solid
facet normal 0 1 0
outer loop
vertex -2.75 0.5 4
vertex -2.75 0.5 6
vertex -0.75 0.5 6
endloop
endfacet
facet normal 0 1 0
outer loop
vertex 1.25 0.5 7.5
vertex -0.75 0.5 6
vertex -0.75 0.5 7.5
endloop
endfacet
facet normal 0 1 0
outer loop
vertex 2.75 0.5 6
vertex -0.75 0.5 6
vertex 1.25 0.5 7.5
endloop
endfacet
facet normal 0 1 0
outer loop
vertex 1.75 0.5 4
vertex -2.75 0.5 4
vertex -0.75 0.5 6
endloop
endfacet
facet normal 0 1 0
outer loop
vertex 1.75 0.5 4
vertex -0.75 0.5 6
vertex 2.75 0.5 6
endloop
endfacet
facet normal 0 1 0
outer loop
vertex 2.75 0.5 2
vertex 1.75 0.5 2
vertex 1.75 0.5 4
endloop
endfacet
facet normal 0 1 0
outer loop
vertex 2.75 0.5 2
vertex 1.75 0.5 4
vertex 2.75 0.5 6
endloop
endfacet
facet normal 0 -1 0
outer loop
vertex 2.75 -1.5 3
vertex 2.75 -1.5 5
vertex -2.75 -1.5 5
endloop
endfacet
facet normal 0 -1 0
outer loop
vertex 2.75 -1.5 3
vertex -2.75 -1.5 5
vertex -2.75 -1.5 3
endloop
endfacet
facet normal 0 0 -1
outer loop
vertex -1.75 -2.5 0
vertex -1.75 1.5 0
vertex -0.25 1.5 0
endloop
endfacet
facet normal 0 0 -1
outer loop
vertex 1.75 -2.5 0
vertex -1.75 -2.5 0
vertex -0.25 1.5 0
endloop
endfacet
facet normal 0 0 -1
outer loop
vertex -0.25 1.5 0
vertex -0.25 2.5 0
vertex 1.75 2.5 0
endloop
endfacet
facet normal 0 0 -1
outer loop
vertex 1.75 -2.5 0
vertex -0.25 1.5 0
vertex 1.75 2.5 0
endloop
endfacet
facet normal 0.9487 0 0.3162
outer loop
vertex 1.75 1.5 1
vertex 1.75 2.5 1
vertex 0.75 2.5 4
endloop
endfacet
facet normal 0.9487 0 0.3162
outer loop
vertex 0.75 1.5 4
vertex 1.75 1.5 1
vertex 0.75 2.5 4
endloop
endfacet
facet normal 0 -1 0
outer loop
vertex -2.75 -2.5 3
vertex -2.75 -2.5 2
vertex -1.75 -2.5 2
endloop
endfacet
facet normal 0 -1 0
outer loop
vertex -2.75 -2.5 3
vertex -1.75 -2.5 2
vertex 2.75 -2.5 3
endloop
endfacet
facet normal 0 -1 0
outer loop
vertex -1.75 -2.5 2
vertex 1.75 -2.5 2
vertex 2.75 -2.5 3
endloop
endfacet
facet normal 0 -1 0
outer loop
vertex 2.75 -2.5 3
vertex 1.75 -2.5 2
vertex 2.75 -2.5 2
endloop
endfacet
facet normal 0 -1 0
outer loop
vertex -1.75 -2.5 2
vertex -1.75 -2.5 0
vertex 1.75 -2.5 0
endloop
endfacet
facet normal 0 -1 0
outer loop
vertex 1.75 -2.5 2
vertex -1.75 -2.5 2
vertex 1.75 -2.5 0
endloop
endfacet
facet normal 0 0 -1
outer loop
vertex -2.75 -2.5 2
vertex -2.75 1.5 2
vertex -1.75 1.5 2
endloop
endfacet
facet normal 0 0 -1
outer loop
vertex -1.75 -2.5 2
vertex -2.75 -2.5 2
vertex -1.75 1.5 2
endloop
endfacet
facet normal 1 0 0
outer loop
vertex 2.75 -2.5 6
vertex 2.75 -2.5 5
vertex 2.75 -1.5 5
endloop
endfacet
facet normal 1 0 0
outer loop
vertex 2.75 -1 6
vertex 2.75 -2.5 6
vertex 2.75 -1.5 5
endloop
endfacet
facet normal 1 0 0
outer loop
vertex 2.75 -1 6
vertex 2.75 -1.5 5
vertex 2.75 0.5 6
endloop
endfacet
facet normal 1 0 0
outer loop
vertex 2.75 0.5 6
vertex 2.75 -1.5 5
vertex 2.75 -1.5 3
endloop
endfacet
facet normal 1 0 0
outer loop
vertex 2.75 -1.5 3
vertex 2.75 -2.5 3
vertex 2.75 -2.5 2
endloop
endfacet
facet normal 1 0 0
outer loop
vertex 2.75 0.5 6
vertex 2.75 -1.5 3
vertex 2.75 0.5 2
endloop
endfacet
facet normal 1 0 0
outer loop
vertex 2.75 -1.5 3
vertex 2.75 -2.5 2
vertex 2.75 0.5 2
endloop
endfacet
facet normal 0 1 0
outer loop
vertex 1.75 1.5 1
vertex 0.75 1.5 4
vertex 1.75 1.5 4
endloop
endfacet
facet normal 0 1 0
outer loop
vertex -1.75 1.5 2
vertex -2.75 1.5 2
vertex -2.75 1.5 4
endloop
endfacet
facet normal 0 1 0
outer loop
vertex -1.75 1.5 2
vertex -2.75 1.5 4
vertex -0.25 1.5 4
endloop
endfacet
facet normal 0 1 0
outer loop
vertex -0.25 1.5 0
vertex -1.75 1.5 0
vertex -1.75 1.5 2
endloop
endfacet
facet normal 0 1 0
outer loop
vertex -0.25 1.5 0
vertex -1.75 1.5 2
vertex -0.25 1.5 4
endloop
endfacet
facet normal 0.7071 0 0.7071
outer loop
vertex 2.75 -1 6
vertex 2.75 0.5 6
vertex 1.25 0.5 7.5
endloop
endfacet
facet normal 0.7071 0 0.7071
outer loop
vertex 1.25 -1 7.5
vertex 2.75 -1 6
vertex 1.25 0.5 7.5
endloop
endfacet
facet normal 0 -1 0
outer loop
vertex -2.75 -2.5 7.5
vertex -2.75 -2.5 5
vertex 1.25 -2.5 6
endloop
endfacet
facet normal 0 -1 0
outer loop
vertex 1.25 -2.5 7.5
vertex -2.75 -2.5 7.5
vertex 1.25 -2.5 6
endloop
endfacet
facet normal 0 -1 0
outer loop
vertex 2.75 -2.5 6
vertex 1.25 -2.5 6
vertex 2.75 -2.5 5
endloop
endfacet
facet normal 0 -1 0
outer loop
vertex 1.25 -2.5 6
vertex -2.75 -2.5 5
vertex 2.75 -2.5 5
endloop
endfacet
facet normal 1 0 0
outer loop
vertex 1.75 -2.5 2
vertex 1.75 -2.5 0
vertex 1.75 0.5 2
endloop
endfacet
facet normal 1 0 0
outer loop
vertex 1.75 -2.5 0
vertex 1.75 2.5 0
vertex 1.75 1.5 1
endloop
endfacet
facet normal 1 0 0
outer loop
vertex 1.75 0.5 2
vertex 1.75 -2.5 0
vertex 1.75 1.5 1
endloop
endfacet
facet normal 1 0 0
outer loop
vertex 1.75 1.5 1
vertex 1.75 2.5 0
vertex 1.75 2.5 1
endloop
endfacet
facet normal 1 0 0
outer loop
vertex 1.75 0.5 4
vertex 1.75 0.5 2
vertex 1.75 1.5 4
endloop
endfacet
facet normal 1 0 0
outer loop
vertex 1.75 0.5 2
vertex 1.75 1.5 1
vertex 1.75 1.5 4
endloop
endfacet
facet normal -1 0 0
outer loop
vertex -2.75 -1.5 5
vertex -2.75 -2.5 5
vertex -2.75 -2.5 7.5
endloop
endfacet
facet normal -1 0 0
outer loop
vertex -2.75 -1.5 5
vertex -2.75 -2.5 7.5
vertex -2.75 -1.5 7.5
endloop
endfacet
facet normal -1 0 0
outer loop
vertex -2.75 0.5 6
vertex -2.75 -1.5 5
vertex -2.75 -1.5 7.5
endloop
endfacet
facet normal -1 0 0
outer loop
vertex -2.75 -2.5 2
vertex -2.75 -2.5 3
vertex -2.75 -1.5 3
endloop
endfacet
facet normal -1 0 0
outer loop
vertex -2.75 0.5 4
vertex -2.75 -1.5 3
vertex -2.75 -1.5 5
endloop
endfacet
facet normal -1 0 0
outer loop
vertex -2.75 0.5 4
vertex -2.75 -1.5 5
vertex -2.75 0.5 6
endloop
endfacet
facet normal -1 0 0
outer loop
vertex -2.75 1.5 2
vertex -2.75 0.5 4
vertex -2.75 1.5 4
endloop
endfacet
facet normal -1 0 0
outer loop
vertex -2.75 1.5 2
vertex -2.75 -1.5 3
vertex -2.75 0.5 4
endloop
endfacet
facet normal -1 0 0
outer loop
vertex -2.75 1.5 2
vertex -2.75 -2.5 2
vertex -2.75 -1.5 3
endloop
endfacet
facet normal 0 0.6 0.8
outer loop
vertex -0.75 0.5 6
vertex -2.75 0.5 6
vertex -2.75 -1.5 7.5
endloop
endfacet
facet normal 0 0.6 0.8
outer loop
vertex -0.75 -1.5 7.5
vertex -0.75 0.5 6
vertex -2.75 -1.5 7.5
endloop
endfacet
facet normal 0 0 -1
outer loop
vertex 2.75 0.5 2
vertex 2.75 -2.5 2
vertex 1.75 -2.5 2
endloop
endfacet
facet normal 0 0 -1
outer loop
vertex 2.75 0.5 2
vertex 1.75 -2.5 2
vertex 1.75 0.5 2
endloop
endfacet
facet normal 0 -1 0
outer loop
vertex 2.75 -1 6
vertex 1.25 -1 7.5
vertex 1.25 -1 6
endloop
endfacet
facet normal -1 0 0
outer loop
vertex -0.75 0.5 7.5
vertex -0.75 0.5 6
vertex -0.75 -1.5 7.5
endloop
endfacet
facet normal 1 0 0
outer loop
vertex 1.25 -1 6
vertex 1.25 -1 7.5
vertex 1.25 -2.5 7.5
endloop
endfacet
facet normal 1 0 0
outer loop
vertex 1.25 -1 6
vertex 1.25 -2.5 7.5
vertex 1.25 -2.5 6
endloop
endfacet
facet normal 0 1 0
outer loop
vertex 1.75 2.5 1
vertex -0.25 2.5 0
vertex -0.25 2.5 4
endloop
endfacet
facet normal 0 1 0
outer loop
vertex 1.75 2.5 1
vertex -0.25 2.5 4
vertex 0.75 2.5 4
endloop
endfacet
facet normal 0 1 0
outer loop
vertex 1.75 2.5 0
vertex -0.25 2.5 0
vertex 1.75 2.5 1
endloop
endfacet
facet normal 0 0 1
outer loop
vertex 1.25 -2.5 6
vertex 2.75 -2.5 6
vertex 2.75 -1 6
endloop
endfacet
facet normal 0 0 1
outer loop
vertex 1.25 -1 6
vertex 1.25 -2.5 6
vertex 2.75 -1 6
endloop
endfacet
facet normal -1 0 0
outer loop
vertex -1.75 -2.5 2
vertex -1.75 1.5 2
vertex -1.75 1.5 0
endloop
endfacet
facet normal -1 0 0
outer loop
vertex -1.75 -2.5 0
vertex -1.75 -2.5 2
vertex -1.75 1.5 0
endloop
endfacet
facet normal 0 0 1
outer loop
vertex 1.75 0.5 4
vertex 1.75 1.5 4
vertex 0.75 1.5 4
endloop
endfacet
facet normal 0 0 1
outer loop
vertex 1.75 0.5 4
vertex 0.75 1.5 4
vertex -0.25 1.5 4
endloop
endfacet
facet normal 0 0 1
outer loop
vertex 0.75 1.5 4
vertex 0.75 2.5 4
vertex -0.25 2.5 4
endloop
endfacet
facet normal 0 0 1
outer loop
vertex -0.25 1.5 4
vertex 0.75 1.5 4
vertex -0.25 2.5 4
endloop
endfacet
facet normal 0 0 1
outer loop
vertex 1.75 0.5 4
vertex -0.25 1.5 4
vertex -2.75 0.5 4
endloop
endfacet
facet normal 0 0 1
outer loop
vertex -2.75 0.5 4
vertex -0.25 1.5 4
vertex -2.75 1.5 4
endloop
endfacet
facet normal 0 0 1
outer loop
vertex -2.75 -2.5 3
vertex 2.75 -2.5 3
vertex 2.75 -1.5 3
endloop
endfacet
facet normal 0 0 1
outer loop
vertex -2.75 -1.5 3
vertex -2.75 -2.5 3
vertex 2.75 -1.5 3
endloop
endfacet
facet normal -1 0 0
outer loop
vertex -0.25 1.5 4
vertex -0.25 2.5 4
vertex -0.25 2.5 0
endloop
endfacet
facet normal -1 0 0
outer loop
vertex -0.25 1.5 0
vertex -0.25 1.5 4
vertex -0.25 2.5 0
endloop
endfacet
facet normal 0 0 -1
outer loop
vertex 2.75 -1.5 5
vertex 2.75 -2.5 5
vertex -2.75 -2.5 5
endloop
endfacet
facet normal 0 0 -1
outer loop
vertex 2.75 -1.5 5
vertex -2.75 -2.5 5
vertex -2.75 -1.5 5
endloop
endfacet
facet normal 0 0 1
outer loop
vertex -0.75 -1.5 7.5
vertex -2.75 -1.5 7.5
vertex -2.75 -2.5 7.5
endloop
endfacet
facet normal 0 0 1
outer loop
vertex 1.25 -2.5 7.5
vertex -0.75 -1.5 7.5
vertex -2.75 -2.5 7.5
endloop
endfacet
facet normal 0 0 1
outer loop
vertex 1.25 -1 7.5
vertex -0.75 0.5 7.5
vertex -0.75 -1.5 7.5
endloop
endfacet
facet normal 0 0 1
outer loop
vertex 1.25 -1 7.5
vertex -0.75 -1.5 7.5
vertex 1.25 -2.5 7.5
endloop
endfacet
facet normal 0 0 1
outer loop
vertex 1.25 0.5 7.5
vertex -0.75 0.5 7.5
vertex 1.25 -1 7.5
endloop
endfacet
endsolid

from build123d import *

# Parameters (mm, degrees)
SKETCH1_W           = 5.5
SKETCH1_H           = 5
BOSS_EXTRUDE1_DEPTH = 7.5
CUT_EXTRUDE1_DEPTH  = 2
CUT_EXTRUDE2_DEPTH  = 1
CUT_EXTRUDE3_DEPTH  = 2
CUT_EXTRUDE4_DEPTH  = 2
SKETCH6_W           = 2.5
SKETCH6_H           = 4
CUT_EXTRUDE5_DEPTH  = 1
SKETCH7_W           = 1
SKETCH7_H           = 2
CUT_EXTRUDE6_DEPTH  = 5
SKETCH8_W           = 2
SKETCH8_H           = 1
CUT_EXTRUDE7_DEPTH  = 6.5
CUT_EXTRUDE8_DEPTH  = 4
SKETCH11_W          = 1.5
SKETCH11_H          = 1.5
CUT_EXTRUDE9_DEPTH  = 1.5


with BuildPart() as part:
    # Sketch1 → Boss-Extrude1 (new body)
    with BuildSketch(Plane.XY):
        Rectangle(SKETCH1_W, SKETCH1_H)
    extrude(amount=BOSS_EXTRUDE1_DEPTH)

    # Sketch2 → Cut-Extrude1 (cut)
    with BuildSketch(Plane.ZY.offset(2.75)):
        Polygon((6, 2.5), (7.5, -1.5), (7.5, 2.5), align=None)
    extrude(amount=-CUT_EXTRUDE1_DEPTH, mode=Mode.SUBTRACT)

    # Sketch3 → Cut-Extrude2 (cut)
    with BuildSketch(Plane(origin=(2.75, 0, 0), x_dir=(0, 0, -1), z_dir=(1, 0, 0))):
        Polygon((0, -2.5), (-2, -2.5), (-2, 0.5), (-4, 0.5), (-4, 2.5), (0, 2.5), align=None)
    extrude(amount=-CUT_EXTRUDE2_DEPTH, mode=Mode.SUBTRACT)

    # Sketch4 → Cut-Extrude3 (cut)
    with BuildSketch(Plane(origin=(0, 2.5, 0), x_dir=(1, 0, 0), z_dir=(0, 1, 0))):
        Polygon((2.75, -7.5), (2.75, -4), (1.75, -4), (-2.75, -4), (-2.75, -6), (-0.75, -6), (-0.75, -7.5), align=None)
    extrude(amount=-CUT_EXTRUDE3_DEPTH, mode=Mode.SUBTRACT)

    # Sketch5 → Cut-Extrude4 (cut)
    with BuildSketch(Plane.ZY.offset(2.75)):
        Polygon((6, 2.5), (6, 0.5), (7.5, -1.5), align=None)
    extrude(amount=-CUT_EXTRUDE4_DEPTH, mode=Mode.SUBTRACT)

    # Sketch6 → Cut-Extrude5 (cut)
    with BuildSketch(Plane(origin=(0, 2.5, 0), x_dir=(1, 0, 0), z_dir=(0, 1, 0))):
        Polygon((1.75, -4), (1.75, -1), (0.75, -4), align=None)
        with Locations((-1.5, -2)):
            Rectangle(SKETCH6_W, SKETCH6_H)
    extrude(amount=-CUT_EXTRUDE5_DEPTH, mode=Mode.SUBTRACT)

    # Sketch7 → Cut-Extrude6 (cut, through all)
    with BuildSketch(Plane(origin=(0, 1.5, 0), x_dir=(1, 0, 0), z_dir=(0, 1, 0))):
        with Locations((-2.25, -1)):
            Rectangle(SKETCH7_W, SKETCH7_H)
    extrude(amount=-CUT_EXTRUDE6_DEPTH, mode=Mode.SUBTRACT)

    # Sketch8 → Cut-Extrude7 (cut, through all)
    with BuildSketch(Plane(origin=(2.75, 0, 0), x_dir=(0, 0, -1), z_dir=(1, 0, 0))):
        with Locations((-4, -2)):
            Rectangle(SKETCH8_W, SKETCH8_H)
    extrude(amount=-CUT_EXTRUDE7_DEPTH, mode=Mode.SUBTRACT)

    # Sketch10 → Cut-Extrude8 (cut, through all)
    with BuildSketch(Plane(origin=(0, 0.5, 0), x_dir=(1, 0, 0), z_dir=(0, 1, 0))):
        Polygon((2.75, -6), (1.25, -7.5), (2.75, -7.5), align=None)
    extrude(amount=-CUT_EXTRUDE8_DEPTH, mode=Mode.SUBTRACT)

    # Sketch11 → Cut-Extrude9 (cut)
    with BuildSketch(Plane(origin=(2.75, 0, 0), x_dir=(0, 0, -1), z_dir=(1, 0, 0))):
        with Locations((-6.75, -1.75)):
            Rectangle(SKETCH11_W, SKETCH11_H)
    extrude(amount=-CUT_EXTRUDE9_DEPTH, mode=Mode.SUBTRACT)


solid = part.part
